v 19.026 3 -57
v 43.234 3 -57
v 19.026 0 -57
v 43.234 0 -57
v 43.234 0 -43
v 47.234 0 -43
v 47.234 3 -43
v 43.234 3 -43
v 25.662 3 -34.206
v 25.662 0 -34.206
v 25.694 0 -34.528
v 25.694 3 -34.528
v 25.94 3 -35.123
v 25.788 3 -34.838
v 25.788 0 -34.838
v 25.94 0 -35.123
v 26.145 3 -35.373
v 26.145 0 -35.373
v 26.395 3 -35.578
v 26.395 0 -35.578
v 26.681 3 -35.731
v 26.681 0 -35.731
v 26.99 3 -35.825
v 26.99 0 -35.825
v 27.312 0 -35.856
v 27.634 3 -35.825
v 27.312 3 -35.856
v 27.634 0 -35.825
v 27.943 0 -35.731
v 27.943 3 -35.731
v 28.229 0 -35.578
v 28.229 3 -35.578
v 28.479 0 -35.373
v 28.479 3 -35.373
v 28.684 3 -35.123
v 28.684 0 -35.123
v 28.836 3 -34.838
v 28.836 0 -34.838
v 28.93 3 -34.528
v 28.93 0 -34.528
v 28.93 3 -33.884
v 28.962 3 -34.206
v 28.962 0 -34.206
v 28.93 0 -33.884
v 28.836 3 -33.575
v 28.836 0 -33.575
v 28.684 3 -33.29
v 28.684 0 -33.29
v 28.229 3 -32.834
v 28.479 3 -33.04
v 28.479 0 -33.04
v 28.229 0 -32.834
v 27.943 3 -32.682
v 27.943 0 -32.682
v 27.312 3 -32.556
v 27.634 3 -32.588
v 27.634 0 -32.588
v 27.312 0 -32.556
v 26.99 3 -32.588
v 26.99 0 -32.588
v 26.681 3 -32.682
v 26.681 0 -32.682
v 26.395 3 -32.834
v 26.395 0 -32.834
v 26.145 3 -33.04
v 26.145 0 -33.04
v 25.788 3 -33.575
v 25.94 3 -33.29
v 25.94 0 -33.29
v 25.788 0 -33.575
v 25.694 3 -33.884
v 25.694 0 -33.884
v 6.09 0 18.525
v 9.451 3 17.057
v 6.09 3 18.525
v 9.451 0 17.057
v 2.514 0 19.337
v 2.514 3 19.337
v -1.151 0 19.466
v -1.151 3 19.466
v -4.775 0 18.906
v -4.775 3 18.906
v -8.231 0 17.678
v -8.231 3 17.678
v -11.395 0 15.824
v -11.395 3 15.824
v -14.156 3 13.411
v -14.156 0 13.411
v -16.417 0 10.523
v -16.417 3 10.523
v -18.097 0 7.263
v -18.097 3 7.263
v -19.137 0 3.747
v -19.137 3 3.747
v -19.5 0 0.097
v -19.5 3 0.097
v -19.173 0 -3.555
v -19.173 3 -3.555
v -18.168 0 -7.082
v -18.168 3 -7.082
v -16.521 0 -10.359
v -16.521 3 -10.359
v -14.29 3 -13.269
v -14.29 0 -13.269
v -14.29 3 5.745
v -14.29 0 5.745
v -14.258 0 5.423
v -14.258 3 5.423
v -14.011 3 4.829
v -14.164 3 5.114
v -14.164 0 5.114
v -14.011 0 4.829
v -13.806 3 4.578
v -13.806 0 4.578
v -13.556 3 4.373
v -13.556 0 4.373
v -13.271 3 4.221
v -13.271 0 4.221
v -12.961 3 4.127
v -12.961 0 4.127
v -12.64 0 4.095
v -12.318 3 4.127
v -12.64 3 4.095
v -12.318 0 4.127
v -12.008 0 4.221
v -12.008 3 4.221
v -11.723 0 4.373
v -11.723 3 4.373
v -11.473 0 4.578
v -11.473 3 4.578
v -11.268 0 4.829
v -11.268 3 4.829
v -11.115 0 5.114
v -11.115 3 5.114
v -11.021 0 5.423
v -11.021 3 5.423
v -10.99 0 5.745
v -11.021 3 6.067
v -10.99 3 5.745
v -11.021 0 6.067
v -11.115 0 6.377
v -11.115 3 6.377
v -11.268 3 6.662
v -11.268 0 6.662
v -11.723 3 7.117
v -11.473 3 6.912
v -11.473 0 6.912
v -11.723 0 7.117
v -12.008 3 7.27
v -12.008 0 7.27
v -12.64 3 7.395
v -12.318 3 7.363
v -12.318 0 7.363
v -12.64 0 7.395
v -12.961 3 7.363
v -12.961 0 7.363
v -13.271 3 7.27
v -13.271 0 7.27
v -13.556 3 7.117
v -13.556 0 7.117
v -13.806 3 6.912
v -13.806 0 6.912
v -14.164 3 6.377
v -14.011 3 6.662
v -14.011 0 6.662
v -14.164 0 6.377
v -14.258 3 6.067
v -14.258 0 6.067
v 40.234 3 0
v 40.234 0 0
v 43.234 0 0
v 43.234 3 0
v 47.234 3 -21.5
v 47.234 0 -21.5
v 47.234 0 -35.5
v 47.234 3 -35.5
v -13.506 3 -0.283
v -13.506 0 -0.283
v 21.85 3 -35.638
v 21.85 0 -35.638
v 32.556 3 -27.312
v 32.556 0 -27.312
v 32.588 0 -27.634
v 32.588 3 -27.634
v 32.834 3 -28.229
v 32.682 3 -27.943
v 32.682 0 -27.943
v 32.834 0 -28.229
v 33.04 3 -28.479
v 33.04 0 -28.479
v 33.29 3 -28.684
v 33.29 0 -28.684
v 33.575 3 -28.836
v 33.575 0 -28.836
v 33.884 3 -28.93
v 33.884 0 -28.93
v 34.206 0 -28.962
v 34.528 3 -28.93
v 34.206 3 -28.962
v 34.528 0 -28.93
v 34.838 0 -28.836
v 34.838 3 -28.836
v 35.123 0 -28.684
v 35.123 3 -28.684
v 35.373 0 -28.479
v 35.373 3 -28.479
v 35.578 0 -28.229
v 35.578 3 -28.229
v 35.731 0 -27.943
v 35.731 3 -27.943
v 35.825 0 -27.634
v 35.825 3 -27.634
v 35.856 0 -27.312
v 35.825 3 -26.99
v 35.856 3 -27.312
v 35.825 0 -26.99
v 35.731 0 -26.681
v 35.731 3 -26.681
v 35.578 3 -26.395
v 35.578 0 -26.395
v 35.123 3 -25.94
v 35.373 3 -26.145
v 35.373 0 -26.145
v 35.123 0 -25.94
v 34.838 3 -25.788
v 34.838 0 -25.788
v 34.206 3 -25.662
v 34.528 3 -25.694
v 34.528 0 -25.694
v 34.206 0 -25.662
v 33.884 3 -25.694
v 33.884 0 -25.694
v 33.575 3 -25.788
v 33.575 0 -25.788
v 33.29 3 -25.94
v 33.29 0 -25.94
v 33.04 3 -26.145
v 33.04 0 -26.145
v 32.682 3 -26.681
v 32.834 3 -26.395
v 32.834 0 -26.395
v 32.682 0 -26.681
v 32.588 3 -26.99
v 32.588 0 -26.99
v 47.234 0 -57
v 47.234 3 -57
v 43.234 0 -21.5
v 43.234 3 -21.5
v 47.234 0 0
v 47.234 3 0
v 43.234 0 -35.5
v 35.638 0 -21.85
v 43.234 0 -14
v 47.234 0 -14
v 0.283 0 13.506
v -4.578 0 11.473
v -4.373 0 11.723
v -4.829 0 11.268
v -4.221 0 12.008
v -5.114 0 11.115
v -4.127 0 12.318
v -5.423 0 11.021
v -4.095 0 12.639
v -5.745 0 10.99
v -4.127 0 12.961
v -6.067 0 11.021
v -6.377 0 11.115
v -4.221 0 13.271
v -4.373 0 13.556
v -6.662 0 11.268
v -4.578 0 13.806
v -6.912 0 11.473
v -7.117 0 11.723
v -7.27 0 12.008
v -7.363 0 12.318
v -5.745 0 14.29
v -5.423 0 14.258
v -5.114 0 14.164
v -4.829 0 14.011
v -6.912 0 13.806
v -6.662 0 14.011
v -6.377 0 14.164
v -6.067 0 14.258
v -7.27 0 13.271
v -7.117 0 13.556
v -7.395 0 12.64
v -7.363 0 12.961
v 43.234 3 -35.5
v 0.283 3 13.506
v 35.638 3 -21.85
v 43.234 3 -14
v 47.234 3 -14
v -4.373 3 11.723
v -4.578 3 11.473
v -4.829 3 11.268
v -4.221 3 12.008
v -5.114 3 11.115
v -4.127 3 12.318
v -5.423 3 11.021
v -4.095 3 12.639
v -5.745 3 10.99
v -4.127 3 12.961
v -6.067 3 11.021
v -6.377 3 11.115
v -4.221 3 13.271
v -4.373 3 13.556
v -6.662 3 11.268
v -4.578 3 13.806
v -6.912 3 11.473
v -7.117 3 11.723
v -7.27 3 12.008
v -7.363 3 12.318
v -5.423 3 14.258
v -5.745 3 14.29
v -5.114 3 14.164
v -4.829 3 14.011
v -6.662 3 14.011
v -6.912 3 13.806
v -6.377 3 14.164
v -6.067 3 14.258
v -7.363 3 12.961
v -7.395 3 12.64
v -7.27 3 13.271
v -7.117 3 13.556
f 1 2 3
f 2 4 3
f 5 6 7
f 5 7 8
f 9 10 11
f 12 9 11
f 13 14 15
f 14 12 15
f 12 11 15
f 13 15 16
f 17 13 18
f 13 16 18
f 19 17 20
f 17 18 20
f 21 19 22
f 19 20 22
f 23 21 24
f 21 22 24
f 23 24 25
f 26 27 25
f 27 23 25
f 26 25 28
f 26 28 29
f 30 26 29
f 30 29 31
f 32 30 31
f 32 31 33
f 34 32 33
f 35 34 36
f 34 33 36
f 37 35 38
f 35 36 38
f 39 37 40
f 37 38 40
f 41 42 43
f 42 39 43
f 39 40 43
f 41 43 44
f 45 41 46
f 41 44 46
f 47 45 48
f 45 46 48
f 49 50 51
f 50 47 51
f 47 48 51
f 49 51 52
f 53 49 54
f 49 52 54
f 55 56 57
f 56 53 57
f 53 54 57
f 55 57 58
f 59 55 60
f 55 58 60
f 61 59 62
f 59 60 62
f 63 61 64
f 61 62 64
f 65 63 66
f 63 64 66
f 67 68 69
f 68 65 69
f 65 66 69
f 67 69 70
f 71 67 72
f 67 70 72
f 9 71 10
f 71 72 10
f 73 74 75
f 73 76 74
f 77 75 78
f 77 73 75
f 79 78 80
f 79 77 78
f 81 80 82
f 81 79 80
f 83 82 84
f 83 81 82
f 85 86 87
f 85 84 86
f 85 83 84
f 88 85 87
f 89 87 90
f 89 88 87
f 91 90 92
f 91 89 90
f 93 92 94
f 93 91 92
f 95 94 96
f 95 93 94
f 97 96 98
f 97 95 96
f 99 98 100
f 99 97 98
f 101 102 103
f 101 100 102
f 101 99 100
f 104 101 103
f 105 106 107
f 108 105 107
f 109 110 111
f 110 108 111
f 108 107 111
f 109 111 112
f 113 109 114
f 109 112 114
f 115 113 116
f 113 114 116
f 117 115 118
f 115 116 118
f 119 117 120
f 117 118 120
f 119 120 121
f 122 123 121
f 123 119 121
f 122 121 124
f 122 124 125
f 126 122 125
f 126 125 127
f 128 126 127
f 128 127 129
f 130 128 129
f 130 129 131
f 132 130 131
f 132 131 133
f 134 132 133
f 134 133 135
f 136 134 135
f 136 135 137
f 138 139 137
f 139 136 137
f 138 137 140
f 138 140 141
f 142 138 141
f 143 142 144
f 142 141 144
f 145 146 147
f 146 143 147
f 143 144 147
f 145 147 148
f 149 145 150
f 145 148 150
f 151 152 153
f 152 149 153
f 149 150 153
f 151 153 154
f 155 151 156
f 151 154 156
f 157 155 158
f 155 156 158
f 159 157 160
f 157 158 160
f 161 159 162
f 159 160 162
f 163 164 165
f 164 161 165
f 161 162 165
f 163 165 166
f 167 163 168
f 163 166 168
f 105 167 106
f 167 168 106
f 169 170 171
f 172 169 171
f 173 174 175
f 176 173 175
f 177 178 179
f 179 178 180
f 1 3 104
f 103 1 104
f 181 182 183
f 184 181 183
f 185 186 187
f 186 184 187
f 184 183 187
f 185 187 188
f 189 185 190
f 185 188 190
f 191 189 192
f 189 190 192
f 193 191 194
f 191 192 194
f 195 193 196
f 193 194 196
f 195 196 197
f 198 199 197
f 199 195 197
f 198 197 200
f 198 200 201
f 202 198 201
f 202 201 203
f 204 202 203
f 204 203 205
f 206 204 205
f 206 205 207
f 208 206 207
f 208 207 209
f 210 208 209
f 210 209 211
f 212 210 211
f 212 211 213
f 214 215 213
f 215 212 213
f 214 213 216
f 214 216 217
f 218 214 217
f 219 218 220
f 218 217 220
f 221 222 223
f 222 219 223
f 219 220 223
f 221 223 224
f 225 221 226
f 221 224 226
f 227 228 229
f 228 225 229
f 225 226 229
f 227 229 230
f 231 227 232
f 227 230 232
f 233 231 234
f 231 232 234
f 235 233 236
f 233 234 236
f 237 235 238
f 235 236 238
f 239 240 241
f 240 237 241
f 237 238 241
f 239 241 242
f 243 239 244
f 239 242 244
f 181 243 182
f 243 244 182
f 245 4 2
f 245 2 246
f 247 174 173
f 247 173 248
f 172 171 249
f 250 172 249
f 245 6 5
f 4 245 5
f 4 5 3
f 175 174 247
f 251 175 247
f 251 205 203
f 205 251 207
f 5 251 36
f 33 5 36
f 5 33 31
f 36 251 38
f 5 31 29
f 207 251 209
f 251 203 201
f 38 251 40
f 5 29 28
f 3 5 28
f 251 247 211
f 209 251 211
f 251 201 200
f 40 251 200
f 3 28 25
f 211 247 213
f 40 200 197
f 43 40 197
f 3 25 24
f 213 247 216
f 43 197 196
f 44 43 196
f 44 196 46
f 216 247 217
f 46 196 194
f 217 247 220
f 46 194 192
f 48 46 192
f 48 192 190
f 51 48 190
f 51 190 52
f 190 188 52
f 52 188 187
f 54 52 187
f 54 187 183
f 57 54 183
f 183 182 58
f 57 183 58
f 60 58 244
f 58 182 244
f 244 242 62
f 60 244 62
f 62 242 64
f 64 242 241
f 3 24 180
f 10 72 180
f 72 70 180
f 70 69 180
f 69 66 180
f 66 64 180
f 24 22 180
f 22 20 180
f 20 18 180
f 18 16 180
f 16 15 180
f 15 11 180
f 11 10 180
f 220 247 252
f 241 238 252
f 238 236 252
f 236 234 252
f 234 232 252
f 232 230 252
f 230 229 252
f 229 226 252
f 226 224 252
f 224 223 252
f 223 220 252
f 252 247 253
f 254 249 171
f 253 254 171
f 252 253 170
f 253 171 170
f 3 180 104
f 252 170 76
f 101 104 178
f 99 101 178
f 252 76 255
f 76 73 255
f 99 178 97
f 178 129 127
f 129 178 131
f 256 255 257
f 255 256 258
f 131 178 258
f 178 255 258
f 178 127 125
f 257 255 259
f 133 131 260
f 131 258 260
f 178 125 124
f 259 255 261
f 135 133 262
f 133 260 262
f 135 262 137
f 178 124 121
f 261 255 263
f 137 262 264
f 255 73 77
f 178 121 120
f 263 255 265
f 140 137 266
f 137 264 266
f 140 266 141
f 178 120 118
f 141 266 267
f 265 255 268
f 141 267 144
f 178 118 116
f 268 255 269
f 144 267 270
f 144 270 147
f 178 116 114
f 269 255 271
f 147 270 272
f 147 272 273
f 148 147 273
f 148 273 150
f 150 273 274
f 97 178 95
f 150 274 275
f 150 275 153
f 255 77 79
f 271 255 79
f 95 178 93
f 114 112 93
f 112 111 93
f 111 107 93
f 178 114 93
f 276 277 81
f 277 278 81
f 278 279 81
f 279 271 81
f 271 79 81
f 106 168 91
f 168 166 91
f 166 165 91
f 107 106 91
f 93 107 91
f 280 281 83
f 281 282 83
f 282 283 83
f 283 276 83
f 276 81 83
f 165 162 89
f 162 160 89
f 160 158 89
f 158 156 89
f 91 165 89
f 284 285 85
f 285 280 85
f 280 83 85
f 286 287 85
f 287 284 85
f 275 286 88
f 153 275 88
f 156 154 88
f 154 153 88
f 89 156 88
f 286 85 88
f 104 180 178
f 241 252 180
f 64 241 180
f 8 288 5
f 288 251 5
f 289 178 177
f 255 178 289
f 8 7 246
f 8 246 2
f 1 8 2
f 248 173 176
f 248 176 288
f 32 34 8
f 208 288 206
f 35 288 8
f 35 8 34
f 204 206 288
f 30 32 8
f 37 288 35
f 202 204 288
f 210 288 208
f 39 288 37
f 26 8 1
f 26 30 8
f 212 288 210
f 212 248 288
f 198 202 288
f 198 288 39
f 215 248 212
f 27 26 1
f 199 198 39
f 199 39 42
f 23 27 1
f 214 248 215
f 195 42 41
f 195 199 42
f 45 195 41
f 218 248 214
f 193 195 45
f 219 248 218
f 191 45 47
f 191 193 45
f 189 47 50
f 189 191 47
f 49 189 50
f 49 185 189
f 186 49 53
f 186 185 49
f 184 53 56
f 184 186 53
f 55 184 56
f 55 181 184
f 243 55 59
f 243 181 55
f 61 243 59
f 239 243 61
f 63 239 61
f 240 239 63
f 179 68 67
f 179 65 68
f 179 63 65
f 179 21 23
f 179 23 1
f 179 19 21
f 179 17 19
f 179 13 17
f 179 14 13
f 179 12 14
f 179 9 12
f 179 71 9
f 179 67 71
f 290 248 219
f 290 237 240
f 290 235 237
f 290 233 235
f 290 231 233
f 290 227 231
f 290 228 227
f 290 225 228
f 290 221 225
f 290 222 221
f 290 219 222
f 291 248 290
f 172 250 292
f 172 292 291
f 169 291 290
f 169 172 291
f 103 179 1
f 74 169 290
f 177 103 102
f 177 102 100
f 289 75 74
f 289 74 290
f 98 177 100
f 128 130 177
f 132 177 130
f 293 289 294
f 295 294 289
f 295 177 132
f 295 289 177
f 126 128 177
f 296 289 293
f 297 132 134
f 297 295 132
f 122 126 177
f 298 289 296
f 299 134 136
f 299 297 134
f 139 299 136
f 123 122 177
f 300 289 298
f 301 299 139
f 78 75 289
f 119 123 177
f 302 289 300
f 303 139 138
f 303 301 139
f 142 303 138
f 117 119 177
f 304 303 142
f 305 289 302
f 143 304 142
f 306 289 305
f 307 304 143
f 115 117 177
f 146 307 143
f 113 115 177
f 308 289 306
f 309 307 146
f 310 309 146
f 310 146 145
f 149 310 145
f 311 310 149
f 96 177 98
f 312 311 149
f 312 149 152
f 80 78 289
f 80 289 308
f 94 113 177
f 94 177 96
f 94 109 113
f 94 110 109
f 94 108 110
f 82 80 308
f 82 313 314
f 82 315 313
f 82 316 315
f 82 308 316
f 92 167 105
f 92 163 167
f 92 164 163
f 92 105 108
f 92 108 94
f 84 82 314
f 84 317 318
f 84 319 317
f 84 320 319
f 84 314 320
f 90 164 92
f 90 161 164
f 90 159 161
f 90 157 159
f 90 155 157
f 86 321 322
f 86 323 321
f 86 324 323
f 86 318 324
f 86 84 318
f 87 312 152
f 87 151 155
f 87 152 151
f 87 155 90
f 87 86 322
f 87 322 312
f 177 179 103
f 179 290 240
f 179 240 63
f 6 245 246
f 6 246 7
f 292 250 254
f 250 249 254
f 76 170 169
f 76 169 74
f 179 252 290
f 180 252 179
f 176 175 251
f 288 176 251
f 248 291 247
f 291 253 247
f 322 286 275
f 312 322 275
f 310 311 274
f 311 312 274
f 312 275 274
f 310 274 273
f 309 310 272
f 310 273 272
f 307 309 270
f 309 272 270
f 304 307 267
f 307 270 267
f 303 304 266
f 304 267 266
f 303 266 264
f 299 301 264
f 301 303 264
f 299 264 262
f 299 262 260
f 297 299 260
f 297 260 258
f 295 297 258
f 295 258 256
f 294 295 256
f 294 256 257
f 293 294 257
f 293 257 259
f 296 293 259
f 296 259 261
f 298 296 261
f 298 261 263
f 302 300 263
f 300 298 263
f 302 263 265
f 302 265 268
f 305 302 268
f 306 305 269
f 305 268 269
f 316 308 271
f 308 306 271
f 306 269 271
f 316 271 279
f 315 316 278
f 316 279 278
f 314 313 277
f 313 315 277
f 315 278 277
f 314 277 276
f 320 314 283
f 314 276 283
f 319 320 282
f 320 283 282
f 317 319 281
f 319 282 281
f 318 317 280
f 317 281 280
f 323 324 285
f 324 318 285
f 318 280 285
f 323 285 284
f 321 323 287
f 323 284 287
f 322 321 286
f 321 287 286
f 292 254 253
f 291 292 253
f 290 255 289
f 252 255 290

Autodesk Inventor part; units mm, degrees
ref_plane "YZ Plane" through (0, 0, 0) normal (1, 0, 0) x (0, 1, 0)
ref_plane "XZ Plane" through (0, 0, 0) normal (0, 1, 0) x (-1, 0, 0)
ref_plane "XY Plane" through (0, 0, 0) normal (0, 0, 1) x (1, 0, 0)
sketch "Boceto1" plane through (0, 0, 0) normal (0, 1, 0) x (-1, 0, 0)
  line L0 (13.5057, -0.2828) -> (-21.8496, -35.6382)
  line L1 (13.5057, -0.2828) -> (-0.2828, 13.5057)
  line L2 (-0.2828, 13.5057) -> (-35.6382, -21.8496)
  line L3 (-35.6382, -21.8496) -> (-21.8496, -35.6382)
  circle A0 centre (12.6395, 5.7452) radius 1.65
  circle A1 centre (5.7452, 12.6395) radius 1.65
  circle A2 centre (-27.312, -34.2063) radius 1.65
  circle A3 centre (-34.2063, -27.312) radius 1.65
  arc A4 (14.2895, -13.2687) -> (-9.4509, 17.0567) centre (0, 0) ccw
  line L4 (-40.2344, 0) -> (-9.4509, 17.0567)
  line L5 (-40.2344, 0) -> (-43.2344, 0)
  line L6 (-19.0256, -57) -> (14.2895, -13.2687)
  line L7 (-43.2344, -57) -> (-19.0256, -57)
  line L8 (-43.2344, 0) -> (-47.2344, 0)
  line L9 (-47.2344, 0) -> (-47.2344, -14)
  line L10 (-47.2344, -14) -> (-43.2344, -14)
  line L11 (-43.2344, -57) -> (-47.2344, -57)
  line L12 (-47.2344, -57) -> (-47.2344, -43)
  line L13 (-47.2344, -43) -> (-43.2344, -43)
  line L14 (-47.2344, -21.5) -> (-43.2344, -21.5)
  line L15 (-47.2344, -21.5) -> (-47.2344, -35.5)
  line L16 (-47.2344, -35.5) -> (-43.2344, -35.5)
  line L17 (-43.2344, -14) -> (-43.2344, -21.5)
  line L18 (-43.2344, -35.5) -> (-43.2344, -43)
  dimension "d17" = 3
  dimension "d21" = 14
  dimension "d22" = 14
  dimension "d25" = 14
  dimension "d109" = 7.5
  dimension "d110" = 7.5
  dimension "d111" = 4
  dimension "d112" = 57
extrude "Extrusión1" add sketch "Boceto1" along normal blind 3
properties part number "planos robot"
